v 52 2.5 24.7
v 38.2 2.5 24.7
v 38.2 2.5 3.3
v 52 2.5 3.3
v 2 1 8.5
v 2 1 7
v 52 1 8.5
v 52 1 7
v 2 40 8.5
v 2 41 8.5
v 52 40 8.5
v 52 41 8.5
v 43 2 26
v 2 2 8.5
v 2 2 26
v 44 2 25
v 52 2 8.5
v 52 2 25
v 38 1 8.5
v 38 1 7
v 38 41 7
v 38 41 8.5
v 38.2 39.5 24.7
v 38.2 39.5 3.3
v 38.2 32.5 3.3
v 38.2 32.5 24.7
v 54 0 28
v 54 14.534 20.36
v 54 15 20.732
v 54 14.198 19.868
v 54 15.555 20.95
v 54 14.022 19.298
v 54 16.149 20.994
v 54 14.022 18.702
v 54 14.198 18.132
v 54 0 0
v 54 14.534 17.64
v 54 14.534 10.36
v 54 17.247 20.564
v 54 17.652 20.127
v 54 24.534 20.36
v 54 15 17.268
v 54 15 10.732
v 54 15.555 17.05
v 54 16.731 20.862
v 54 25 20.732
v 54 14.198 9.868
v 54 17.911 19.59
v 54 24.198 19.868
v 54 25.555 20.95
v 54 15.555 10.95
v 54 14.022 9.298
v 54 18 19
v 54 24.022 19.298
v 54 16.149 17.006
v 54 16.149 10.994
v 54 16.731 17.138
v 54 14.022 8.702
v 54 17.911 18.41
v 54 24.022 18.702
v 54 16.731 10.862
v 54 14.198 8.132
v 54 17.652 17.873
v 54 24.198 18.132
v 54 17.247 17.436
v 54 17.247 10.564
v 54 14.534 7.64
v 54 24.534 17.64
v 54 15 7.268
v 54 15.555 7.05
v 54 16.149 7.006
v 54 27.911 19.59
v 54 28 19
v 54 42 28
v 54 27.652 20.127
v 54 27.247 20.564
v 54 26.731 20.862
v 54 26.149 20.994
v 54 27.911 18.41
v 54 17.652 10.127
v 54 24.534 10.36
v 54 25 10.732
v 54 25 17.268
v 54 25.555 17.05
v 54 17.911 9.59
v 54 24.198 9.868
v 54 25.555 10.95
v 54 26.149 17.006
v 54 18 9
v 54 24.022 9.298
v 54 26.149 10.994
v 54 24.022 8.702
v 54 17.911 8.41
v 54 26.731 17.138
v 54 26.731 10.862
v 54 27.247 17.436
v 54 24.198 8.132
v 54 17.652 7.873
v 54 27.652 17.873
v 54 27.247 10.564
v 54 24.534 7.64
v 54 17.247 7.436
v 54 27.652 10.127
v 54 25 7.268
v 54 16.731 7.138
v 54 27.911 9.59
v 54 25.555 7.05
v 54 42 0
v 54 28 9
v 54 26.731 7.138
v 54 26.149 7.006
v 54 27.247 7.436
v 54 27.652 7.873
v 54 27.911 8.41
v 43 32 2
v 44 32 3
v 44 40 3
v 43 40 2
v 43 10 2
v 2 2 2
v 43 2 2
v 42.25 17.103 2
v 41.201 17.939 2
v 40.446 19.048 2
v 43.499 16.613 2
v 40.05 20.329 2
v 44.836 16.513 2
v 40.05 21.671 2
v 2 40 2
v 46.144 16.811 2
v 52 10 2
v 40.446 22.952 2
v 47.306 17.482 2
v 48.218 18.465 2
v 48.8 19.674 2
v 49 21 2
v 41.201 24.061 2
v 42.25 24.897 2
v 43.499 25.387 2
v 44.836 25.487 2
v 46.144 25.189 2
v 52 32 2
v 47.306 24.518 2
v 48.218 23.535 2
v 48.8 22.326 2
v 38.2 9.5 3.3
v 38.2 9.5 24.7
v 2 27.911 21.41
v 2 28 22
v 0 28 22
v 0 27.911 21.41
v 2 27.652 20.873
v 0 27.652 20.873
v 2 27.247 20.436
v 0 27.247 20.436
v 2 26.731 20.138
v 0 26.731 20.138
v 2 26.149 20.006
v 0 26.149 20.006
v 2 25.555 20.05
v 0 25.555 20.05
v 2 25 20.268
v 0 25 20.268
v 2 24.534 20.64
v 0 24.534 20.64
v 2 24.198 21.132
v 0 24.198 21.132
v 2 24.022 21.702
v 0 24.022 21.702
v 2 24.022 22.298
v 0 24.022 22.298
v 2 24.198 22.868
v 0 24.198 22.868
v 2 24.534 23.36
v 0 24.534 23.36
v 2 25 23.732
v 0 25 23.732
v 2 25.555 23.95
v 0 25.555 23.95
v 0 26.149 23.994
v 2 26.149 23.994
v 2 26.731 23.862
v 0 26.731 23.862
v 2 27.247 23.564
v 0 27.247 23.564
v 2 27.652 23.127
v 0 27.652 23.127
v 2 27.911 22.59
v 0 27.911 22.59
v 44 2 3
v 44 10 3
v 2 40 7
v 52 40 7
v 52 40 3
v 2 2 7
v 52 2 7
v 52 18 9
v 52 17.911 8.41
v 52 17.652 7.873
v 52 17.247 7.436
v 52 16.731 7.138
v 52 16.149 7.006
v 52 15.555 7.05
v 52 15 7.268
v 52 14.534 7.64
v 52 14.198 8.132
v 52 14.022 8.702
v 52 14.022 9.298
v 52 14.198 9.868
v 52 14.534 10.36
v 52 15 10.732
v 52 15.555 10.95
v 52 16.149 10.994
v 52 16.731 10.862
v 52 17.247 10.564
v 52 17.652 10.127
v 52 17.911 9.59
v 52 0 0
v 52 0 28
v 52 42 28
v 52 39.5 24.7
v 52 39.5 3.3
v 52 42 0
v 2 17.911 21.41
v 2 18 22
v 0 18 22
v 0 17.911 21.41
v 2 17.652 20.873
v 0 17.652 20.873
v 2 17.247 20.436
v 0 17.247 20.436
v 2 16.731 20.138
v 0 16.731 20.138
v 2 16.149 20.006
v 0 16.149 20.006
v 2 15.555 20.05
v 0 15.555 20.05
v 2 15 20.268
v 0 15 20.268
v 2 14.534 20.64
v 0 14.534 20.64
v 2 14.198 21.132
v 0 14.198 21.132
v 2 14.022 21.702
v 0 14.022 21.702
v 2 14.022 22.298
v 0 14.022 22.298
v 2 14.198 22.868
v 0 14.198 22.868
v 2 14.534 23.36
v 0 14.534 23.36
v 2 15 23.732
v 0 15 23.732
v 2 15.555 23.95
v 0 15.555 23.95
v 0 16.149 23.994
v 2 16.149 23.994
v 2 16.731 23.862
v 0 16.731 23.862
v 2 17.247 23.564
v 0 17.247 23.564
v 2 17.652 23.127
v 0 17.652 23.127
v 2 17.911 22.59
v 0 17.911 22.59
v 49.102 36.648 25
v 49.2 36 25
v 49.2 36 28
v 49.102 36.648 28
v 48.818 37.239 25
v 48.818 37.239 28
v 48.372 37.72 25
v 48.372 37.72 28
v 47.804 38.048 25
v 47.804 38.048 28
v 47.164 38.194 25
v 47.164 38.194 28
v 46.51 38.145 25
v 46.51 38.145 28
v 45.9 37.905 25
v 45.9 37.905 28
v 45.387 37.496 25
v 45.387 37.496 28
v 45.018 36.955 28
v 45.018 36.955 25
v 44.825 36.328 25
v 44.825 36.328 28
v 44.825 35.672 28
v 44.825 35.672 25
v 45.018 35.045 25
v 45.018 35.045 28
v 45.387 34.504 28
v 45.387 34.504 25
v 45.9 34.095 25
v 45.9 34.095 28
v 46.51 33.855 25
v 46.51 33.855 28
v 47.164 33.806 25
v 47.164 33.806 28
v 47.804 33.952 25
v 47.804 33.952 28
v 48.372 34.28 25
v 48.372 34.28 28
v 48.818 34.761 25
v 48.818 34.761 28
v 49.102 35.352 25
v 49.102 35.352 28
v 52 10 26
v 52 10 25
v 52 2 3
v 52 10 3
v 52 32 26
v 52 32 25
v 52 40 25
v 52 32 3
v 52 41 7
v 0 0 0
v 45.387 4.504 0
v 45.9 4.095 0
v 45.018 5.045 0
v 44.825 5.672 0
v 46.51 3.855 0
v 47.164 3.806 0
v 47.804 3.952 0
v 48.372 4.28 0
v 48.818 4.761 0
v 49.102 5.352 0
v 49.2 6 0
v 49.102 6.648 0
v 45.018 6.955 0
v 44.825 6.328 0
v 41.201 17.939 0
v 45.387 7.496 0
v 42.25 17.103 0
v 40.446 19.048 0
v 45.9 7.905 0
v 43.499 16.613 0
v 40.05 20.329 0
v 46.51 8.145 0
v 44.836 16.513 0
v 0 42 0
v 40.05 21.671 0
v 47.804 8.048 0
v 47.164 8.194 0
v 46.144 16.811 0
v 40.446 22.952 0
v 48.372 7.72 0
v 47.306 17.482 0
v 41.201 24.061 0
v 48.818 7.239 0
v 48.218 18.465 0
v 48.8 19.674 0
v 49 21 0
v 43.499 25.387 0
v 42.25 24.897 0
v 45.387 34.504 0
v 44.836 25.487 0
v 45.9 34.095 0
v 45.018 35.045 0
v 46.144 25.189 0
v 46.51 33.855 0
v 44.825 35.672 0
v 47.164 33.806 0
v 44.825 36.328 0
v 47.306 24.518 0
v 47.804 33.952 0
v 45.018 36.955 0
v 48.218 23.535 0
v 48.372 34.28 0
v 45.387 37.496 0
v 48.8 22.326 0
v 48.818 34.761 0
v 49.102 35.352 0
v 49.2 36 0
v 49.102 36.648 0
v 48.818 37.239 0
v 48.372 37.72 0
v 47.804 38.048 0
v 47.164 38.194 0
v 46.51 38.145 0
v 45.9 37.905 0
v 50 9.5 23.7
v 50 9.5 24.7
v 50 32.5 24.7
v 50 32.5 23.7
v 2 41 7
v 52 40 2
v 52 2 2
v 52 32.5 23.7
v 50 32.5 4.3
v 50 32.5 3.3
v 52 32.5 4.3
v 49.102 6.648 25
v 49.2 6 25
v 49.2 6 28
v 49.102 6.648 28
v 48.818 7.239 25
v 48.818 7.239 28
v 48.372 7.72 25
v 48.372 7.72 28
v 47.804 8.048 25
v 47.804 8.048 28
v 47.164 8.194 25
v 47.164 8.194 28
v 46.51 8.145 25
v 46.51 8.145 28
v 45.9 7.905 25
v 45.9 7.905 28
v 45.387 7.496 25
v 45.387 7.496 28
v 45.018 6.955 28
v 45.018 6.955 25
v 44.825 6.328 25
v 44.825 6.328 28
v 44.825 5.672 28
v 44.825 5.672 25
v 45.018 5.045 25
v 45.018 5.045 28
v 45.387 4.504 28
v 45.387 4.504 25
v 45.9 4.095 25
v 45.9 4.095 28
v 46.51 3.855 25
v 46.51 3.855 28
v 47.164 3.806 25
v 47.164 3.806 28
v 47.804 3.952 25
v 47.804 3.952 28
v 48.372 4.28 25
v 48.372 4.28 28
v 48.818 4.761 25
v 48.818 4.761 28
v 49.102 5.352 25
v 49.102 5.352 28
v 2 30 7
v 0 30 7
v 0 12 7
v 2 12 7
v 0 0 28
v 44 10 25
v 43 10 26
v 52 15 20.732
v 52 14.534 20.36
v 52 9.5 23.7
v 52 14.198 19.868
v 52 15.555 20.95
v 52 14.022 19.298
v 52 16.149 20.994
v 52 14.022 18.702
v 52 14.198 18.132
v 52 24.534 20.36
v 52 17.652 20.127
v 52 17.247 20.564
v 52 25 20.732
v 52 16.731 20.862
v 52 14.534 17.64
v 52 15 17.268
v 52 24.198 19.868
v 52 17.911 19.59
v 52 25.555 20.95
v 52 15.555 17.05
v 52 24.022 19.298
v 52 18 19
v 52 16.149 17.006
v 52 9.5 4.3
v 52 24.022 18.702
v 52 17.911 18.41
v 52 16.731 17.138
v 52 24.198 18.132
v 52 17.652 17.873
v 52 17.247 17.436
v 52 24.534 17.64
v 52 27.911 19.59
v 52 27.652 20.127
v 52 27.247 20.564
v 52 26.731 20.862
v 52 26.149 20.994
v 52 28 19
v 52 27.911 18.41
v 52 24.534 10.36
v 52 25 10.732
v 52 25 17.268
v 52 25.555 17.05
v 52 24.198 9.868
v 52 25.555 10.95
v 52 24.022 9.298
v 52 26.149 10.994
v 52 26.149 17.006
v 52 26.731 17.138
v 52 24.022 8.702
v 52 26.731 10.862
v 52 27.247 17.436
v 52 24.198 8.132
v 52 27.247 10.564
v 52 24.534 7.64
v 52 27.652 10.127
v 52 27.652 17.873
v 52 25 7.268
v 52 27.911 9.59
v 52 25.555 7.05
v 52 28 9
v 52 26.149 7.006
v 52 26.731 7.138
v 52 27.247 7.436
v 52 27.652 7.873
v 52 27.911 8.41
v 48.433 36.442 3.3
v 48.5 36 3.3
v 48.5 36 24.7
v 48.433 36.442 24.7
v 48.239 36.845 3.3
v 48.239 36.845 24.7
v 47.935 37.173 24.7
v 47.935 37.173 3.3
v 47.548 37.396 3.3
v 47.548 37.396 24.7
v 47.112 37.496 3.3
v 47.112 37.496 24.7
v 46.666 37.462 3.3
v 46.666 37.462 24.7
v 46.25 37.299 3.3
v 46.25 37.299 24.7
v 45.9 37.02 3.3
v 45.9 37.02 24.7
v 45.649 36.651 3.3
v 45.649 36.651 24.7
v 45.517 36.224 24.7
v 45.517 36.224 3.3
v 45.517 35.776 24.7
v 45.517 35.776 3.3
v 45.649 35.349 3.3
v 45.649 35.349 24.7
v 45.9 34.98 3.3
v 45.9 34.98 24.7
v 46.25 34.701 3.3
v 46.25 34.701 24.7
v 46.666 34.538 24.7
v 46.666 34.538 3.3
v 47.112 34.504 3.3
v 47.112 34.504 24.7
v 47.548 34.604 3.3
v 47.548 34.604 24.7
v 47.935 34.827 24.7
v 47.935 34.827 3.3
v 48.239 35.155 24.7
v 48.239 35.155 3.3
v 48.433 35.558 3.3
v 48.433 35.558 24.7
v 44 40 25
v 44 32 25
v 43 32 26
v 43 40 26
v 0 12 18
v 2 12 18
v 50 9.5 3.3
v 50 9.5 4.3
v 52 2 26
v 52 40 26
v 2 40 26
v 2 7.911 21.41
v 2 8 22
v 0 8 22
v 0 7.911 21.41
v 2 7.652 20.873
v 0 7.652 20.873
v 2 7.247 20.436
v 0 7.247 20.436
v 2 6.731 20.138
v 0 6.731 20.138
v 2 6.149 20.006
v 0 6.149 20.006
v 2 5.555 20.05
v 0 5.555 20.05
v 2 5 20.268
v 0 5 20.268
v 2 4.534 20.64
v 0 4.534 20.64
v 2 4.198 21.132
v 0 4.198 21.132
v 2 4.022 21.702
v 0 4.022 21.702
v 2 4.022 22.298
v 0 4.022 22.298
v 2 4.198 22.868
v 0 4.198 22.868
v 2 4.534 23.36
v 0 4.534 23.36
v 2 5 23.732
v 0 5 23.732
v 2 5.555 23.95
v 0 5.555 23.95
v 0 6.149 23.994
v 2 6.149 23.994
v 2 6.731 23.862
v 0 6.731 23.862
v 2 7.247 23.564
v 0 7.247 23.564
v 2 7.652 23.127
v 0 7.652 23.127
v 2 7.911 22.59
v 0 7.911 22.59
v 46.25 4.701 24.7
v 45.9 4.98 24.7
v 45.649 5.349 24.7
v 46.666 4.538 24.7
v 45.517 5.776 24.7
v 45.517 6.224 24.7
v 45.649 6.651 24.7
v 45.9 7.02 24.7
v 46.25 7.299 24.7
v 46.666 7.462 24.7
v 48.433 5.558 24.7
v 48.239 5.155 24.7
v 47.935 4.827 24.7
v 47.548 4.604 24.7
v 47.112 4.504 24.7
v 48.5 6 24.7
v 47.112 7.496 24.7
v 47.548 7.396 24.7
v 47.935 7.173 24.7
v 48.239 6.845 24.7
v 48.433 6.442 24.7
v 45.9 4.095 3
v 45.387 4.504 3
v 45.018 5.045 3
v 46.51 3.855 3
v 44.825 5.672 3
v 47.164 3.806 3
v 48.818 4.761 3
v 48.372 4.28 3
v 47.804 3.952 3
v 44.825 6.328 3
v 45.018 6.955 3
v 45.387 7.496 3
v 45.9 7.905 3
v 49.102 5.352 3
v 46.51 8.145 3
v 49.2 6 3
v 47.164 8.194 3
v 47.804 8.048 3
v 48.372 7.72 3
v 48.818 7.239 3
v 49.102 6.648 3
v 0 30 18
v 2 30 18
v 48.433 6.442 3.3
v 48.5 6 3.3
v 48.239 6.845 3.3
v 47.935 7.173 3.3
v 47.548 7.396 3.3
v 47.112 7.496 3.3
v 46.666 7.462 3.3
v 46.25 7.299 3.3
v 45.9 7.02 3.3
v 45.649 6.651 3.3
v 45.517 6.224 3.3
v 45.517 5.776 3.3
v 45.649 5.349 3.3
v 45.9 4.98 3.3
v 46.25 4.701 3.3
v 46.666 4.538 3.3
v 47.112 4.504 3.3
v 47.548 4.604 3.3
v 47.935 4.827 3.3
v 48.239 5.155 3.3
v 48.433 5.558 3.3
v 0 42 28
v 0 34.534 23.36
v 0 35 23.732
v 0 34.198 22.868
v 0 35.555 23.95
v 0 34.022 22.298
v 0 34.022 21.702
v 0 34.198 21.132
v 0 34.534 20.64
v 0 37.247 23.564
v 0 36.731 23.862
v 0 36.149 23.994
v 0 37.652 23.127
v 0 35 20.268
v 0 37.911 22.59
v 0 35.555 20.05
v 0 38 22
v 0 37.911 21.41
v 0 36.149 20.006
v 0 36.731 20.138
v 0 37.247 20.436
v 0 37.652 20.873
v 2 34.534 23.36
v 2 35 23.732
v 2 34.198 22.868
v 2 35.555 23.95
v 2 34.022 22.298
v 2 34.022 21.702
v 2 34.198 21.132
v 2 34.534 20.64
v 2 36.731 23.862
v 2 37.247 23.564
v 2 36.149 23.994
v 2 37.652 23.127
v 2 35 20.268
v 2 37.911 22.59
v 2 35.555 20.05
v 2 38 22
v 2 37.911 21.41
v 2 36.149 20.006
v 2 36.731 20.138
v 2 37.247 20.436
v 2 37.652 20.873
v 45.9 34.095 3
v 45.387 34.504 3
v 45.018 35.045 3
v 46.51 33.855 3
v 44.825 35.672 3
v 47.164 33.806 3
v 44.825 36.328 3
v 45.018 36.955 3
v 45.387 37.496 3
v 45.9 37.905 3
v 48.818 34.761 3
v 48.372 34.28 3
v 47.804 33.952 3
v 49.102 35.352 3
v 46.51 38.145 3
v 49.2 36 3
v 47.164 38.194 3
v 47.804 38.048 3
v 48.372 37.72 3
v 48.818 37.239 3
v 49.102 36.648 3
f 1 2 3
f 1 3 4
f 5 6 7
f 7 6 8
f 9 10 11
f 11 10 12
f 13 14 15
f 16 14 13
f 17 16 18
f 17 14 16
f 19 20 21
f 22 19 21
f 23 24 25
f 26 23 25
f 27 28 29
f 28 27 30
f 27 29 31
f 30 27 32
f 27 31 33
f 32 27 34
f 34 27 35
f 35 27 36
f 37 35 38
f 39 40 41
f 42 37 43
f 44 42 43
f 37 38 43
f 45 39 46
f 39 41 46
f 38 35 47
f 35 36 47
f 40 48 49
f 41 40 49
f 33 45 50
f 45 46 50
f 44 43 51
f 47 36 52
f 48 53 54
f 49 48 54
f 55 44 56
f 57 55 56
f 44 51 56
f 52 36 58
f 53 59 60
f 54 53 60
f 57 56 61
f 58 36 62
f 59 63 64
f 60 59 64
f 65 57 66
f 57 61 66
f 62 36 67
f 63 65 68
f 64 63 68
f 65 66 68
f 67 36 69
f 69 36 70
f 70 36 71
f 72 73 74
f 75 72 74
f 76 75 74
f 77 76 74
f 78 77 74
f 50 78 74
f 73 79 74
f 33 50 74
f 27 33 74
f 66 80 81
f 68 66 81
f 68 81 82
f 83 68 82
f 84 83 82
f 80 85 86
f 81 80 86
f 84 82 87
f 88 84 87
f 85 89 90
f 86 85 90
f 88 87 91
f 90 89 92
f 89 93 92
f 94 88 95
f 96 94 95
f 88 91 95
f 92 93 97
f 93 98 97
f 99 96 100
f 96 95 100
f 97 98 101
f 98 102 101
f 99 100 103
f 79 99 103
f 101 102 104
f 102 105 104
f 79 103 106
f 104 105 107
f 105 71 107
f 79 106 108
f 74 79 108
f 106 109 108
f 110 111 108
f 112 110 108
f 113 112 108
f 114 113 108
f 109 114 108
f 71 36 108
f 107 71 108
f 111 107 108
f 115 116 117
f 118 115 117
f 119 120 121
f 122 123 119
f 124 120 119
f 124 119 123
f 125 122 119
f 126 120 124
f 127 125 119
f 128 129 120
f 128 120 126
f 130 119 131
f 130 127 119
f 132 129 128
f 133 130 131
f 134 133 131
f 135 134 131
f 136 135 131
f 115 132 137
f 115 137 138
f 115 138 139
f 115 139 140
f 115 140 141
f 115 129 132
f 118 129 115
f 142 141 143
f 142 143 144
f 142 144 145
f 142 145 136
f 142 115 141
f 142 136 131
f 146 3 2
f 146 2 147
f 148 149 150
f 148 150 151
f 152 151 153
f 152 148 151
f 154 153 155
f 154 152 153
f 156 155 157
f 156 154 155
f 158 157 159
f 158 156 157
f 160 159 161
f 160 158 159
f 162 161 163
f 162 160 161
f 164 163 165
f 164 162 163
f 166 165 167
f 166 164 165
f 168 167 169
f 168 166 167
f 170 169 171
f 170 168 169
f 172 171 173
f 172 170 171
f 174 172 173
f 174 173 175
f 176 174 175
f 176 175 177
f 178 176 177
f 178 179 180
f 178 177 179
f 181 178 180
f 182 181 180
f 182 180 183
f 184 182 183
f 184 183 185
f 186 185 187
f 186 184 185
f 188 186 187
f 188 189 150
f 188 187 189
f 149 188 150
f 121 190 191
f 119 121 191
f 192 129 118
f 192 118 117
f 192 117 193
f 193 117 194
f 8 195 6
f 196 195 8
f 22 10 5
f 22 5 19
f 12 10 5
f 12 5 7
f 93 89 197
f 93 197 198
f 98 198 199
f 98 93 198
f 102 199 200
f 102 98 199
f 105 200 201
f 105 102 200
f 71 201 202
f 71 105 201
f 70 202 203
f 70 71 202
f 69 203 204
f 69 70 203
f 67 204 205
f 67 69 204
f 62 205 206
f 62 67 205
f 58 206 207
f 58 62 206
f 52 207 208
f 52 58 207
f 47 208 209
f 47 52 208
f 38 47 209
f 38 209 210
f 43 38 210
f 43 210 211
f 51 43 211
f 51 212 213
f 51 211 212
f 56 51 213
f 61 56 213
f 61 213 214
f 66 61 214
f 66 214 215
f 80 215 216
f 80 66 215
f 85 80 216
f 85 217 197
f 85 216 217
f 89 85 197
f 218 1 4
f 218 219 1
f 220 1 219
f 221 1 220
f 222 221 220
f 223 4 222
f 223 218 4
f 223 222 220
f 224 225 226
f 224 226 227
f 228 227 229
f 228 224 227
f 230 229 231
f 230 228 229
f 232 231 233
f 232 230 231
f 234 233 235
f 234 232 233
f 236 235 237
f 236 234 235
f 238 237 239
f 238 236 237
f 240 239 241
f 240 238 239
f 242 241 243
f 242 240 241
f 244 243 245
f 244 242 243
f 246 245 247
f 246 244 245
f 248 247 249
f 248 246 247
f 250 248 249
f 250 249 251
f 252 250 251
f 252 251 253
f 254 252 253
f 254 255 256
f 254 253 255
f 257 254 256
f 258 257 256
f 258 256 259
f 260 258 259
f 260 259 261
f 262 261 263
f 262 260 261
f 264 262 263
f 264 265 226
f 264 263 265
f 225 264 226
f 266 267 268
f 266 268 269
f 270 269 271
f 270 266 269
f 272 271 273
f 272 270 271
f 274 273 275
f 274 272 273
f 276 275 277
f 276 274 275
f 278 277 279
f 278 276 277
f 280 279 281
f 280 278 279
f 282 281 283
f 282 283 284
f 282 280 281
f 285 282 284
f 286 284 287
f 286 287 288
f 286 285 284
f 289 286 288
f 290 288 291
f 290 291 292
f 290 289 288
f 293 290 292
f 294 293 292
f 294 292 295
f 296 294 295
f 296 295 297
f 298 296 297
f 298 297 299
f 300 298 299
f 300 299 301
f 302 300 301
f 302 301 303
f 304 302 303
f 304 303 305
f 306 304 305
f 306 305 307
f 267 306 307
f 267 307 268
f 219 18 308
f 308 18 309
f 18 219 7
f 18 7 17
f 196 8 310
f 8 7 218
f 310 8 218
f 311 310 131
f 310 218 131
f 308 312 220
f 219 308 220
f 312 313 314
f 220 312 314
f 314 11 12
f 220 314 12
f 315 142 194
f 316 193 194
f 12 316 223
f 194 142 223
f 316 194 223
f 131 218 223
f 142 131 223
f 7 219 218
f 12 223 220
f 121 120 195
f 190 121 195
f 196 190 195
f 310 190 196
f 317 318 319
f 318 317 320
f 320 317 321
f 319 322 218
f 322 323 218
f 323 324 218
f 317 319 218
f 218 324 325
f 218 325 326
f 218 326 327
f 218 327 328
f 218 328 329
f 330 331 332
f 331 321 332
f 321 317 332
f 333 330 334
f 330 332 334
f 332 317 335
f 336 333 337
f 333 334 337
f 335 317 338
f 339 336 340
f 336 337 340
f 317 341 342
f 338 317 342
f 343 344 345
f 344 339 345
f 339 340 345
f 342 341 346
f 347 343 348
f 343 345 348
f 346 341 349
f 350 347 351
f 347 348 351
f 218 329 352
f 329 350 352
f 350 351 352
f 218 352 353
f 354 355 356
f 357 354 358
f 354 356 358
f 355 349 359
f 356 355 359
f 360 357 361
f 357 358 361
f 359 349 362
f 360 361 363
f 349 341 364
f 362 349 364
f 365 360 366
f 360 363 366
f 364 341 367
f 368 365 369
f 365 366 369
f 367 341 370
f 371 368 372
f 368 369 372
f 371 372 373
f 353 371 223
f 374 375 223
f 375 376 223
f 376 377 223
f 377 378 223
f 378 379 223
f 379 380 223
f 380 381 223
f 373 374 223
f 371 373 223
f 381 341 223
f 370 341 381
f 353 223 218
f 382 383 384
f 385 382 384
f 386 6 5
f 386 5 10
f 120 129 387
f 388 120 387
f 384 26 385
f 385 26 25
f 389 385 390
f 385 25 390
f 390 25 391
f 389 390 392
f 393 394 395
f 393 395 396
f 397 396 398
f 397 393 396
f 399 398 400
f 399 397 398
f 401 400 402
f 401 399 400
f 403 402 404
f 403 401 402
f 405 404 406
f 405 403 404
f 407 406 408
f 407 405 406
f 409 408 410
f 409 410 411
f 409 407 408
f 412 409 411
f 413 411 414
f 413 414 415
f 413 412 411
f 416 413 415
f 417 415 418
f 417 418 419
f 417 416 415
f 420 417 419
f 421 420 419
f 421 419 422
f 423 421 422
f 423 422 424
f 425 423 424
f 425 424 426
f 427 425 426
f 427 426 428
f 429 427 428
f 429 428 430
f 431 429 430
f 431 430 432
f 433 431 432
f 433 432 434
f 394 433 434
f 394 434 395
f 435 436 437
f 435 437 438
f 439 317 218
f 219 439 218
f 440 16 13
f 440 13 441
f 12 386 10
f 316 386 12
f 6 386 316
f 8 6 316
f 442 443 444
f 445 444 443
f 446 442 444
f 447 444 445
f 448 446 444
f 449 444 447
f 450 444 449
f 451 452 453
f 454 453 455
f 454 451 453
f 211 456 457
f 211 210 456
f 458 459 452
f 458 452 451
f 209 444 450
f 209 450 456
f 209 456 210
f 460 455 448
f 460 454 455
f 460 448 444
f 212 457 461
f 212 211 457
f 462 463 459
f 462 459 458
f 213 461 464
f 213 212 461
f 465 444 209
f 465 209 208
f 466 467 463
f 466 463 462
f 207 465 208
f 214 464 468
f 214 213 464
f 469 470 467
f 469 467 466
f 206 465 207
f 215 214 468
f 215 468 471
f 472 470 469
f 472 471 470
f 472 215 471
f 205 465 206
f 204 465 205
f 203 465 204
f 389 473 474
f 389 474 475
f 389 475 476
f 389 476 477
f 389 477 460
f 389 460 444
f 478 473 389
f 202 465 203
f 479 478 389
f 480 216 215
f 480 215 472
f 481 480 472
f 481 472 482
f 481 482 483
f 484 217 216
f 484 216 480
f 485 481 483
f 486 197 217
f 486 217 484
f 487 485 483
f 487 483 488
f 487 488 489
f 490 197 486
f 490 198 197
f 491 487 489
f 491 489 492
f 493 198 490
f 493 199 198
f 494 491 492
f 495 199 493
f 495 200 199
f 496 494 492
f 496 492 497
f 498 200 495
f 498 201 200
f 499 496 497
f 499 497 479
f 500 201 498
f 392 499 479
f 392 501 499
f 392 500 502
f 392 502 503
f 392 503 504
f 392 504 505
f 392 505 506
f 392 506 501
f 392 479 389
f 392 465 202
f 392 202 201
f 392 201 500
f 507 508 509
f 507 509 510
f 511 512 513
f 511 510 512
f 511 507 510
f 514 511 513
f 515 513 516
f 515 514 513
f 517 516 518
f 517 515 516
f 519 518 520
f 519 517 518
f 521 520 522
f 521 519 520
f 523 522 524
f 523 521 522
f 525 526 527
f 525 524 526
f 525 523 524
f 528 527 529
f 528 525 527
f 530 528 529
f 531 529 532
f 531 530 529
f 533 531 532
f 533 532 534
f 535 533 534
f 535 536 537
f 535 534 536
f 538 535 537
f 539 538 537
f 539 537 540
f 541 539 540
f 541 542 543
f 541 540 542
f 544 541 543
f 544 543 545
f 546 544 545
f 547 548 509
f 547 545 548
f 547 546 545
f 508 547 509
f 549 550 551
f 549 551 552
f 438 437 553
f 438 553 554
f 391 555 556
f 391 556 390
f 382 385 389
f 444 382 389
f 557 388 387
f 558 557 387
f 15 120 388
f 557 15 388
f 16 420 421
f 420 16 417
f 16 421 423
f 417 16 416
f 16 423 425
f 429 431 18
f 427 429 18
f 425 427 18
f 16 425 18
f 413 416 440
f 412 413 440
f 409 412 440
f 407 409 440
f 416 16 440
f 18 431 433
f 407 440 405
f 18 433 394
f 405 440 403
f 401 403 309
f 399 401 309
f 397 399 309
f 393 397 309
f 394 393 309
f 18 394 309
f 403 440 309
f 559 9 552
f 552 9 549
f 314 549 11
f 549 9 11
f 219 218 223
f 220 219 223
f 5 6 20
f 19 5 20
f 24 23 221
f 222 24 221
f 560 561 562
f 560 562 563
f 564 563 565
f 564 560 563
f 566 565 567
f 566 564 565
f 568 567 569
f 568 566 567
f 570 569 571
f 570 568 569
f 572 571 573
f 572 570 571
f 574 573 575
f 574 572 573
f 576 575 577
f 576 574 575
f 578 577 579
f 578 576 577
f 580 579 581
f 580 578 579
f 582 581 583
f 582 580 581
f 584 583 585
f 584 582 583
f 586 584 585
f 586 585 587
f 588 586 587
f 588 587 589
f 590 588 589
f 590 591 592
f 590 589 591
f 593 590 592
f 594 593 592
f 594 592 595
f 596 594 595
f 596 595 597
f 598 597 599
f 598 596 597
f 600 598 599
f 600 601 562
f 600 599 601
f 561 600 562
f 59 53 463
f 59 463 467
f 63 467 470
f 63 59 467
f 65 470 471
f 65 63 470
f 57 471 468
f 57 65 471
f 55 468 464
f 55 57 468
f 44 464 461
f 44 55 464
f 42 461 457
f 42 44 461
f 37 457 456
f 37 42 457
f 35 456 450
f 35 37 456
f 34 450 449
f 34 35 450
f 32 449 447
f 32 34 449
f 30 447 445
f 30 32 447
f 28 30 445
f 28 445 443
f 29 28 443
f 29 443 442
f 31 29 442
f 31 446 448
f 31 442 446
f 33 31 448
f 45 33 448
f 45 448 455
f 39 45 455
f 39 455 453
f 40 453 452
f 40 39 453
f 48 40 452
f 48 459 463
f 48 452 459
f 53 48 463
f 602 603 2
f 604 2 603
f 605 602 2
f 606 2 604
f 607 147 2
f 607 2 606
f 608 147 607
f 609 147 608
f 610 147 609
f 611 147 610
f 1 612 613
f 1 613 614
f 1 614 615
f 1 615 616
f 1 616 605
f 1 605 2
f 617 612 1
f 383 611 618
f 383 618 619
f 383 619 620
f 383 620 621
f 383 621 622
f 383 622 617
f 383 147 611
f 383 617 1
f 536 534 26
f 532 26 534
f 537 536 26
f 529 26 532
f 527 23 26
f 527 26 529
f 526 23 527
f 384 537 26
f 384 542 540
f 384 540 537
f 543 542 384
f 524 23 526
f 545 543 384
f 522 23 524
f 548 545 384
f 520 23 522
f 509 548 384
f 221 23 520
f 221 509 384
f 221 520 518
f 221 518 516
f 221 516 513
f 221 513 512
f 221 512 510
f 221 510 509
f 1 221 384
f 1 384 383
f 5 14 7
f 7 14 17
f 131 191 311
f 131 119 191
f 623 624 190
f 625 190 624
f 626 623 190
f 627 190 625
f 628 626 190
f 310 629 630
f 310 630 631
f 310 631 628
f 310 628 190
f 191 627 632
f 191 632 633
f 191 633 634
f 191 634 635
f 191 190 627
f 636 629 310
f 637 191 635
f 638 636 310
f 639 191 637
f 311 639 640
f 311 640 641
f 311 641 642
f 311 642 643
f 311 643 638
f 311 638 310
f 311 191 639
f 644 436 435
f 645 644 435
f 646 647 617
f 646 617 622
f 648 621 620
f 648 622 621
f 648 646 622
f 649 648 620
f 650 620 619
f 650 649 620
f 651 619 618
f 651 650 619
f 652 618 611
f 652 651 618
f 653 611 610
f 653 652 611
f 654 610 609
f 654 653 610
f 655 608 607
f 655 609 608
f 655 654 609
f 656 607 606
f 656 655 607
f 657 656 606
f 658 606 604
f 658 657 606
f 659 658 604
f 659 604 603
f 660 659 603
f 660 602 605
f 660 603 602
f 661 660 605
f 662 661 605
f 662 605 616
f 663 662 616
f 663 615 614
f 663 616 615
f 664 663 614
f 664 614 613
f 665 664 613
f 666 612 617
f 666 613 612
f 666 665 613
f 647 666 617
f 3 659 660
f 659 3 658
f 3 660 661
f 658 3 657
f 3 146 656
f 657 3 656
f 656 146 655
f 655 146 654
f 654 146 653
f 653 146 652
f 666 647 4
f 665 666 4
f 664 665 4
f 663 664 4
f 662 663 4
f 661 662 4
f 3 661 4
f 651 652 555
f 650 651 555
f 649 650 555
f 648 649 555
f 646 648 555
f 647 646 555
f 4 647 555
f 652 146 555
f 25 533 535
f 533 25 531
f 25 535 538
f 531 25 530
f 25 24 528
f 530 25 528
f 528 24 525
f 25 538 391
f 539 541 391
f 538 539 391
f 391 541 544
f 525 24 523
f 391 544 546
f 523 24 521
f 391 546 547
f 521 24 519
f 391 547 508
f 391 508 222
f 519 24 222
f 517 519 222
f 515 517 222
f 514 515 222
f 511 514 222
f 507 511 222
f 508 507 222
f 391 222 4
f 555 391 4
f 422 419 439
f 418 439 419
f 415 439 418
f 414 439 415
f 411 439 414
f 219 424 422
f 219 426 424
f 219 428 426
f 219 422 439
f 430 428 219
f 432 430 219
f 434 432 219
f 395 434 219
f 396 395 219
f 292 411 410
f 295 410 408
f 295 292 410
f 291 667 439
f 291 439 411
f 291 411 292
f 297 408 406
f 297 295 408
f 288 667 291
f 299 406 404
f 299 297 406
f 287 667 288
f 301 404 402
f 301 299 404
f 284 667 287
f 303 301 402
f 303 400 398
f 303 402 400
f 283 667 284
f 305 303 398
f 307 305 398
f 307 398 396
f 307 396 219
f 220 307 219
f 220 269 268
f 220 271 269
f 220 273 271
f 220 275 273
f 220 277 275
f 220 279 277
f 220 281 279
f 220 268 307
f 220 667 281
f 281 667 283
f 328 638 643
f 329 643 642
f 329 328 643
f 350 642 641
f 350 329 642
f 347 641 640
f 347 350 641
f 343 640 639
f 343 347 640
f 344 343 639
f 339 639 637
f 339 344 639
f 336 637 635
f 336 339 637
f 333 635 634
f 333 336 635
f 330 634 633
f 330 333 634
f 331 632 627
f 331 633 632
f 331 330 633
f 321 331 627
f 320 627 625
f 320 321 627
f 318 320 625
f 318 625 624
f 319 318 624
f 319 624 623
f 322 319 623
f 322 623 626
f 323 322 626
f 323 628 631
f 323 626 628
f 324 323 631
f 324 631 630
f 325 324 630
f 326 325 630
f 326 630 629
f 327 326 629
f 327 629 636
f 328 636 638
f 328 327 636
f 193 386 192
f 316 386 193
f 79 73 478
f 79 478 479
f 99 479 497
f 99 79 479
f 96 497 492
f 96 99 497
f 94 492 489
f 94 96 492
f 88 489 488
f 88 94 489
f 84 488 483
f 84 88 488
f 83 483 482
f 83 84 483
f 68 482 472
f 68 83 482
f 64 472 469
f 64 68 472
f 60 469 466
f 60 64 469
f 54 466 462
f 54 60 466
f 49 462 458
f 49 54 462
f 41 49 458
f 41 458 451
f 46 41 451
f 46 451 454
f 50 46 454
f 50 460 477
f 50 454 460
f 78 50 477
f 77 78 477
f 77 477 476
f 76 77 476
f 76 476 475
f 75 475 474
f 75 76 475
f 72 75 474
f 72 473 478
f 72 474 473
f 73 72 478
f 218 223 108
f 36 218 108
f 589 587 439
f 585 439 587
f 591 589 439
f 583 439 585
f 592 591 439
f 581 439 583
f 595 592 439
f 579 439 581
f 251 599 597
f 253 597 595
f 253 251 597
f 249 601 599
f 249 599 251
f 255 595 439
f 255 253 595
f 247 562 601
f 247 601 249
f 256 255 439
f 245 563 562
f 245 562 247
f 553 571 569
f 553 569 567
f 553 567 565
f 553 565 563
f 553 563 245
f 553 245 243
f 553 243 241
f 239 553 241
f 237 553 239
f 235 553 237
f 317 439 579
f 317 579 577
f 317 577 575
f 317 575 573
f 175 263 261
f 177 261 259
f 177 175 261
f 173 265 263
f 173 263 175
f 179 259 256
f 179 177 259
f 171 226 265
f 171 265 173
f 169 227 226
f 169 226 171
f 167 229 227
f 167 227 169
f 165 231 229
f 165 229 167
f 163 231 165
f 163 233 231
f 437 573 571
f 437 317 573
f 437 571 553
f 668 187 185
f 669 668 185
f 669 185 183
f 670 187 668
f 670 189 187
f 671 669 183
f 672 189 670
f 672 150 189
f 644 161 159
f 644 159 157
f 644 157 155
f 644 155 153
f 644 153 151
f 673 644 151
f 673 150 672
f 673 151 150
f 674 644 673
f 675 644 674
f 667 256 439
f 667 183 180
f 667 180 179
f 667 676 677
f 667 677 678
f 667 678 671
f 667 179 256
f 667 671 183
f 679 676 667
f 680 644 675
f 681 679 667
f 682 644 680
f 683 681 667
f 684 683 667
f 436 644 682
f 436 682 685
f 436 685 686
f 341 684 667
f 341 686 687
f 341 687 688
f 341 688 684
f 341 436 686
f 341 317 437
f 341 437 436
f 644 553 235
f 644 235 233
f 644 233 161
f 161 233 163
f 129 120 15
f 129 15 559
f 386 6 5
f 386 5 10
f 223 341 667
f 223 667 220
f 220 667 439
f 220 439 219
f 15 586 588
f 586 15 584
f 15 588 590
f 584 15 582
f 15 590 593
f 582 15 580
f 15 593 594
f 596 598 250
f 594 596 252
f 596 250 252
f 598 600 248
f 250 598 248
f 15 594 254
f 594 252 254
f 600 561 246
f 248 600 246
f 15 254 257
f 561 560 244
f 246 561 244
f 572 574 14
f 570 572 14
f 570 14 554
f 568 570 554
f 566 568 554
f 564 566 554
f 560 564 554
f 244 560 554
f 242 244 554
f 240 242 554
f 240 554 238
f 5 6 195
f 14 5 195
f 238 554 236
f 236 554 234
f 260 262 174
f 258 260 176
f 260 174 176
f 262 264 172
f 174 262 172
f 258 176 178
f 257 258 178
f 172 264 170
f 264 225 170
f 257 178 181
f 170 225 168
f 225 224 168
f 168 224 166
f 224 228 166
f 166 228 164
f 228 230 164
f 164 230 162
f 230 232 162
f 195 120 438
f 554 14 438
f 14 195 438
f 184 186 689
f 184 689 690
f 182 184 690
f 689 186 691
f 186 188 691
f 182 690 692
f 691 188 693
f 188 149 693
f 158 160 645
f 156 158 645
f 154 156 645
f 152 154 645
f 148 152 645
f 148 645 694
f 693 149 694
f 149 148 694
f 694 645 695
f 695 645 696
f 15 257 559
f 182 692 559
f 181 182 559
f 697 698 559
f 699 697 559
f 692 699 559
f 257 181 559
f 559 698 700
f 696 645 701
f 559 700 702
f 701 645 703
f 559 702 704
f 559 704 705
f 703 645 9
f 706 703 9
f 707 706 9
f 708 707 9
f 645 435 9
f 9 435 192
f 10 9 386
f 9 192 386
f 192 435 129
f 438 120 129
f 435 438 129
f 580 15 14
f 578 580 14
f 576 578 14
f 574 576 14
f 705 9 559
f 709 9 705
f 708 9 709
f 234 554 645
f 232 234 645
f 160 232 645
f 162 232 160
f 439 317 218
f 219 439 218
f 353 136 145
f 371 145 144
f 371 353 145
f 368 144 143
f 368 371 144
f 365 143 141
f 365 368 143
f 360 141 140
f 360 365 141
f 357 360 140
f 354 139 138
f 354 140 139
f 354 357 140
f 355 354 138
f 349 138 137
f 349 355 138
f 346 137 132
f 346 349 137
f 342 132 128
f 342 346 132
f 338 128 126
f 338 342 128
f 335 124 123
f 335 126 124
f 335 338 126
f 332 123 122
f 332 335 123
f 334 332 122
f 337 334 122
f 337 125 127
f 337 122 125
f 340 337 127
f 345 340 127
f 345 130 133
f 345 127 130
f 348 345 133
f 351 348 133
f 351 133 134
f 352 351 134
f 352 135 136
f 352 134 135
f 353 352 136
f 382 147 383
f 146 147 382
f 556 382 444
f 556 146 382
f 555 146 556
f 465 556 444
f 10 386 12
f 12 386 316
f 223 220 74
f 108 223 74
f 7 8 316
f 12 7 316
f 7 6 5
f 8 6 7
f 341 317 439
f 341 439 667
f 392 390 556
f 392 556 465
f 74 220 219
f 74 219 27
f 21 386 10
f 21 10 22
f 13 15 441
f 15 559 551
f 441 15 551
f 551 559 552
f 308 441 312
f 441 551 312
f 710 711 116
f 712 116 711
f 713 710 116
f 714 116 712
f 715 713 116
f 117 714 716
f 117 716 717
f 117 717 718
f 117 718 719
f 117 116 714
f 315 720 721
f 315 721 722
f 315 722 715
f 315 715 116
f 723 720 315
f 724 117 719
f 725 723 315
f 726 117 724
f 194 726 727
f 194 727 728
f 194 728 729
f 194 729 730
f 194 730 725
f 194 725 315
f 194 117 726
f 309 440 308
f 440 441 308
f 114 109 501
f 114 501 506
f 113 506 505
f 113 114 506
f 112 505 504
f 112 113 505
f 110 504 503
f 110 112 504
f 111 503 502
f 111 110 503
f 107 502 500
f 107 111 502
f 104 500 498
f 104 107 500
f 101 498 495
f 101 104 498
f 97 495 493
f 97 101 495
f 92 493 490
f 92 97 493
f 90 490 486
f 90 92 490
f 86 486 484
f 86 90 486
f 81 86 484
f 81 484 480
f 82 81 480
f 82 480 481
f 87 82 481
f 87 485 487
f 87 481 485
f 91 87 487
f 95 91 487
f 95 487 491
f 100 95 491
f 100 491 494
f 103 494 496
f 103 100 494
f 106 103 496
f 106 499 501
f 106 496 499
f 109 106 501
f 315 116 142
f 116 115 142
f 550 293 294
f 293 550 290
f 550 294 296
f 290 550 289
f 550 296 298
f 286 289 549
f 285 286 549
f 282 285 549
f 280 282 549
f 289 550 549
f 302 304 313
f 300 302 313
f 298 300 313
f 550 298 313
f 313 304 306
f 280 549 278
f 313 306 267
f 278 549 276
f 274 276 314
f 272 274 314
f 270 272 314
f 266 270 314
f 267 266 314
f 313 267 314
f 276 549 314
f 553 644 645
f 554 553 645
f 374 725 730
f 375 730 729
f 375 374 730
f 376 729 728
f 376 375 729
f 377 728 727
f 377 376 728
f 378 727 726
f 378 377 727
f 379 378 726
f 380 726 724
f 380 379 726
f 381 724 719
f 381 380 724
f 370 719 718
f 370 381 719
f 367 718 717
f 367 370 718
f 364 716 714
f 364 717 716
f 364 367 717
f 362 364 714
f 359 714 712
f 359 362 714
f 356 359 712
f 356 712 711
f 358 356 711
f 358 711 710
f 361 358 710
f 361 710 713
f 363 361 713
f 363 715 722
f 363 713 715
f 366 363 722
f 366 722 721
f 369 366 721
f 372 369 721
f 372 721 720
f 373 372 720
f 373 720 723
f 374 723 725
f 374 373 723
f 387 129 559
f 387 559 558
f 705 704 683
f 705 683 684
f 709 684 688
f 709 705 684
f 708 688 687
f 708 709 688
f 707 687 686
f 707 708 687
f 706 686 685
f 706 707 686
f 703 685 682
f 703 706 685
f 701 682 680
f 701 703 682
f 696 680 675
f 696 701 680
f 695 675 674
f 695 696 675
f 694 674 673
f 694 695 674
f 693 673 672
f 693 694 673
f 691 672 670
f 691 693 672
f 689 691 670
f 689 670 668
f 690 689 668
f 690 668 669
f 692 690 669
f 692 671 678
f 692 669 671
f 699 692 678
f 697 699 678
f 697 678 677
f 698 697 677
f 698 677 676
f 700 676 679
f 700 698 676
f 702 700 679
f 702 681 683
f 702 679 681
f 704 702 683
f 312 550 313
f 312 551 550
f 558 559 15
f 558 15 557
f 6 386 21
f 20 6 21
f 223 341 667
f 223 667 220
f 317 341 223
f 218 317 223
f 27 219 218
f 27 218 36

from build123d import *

# Parameters (mm, degrees)
BOX003_W          = 36
BOX003_H          = 40
BOX003_DEPTH      = 1.5
CYLINDER001_R     = 2.2
CYLINDER001_DEPTH = 28
ARRAY001_Y_COUNT  = 2
ARRAY001_Y_PITCH  = 30
BOX005_W          = 10
BOX005_H          = 10
BOX005_DEPTH      = 3
CHAMFER_SIZE      = 2
ARRAY_Y_COUNT     = 2
ARRAY_Y_PITCH     = 32
BOX_W             = 50
BOX_H             = 38
BOX_DEPTH         = 24
BOX004_W          = 10
BOX004_H          = 18
BOX004_DEPTH      = 11
CYLINDER_R        = 4.5
CYLINDER_DEPTH    = 10
CYLINDER002_R     = 2
CYLINDER002_DEPTH = 100
ARRAY002_Y_COUNT  = 4
ARRAY002_Y_PITCH  = 10
BOX001_W          = 50
BOX001_H          = 40
BOX001_DEPTH      = 1.5
BOX002_W          = 52
BOX002_H          = 42
BOX002_DEPTH      = 28
CYLINDER003_R     = 1.5
CYLINDER003_DEPTH = 28
ARRAY003_Y_COUNT  = 2
ARRAY003_Y_PITCH  = 30
CYLINDER004_R     = 2
CYLINDER004_DEPTH = 100
ARRAY004_Y_COUNT  = 2
ARRAY004_Y_PITCH  = 10
ARRAY004_Z_COUNT  = 2
ARRAY004_Z_PITCH  = 10
BOX007_W          = 13.8
BOX007_H          = 7
BOX007_DEPTH      = 21.4
BOX006_W          = 2
BOX006_H          = 42
BOX006_DEPTH      = 28
BOX008_W          = 2
BOX008_H          = 36
BOX008_DEPTH      = 1
BOX009_W          = 50
BOX009_H          = 38
BOX009_DEPTH      = 24
BOX010_W          = 50
BOX010_H          = 40
BOX010_DEPTH      = 1.5
BOX011_W          = 52
BOX011_H          = 42
BOX011_DEPTH      = 28


with BuildPart() as pcb_mockup:
    # Box003 → Box003 (new body)
    with BuildSketch(Plane(origin=(2, 1, 7), x_dir=(1, 0, 0), z_dir=(0, 0, 1))):
        with Locations((18, 20)):
            Rectangle(BOX003_W, BOX003_H)
    extrude(amount=BOX003_DEPTH)


with BuildPart() as bolt_hole_array:
    # Cylinder001 → Cylinder001 (new body)
    with BuildSketch(Plane.XY):
        Circle(CYLINDER001_R)
    extrude(amount=CYLINDER001_DEPTH)

    # Array001 Y: bolt hole array ×2


with BuildPart() as bolt_hole_array_1:
    add(bolt_hole_array.part)
    with Locations(*[(0, i * ARRAY001_Y_PITCH, 0) for i in range(1, ARRAY001_Y_COUNT)]):
        add(bolt_hole_array.part)


with BuildPart() as bolt_hole_array_2:
    # Array001 placement: moved
    add(bolt_hole_array_1.part.moved(Location((47, 6, 0))))


with BuildPart() as bolt_hole_stand_array:
    # Box005 → Box005 (new body)
    with BuildSketch(Plane(origin=(42, 0, 0), x_dir=(1, 0, 0), z_dir=(0, 0, 1))):
        with Locations((5, 5)):
            Rectangle(BOX005_W, BOX005_H)
    extrude(amount=BOX005_DEPTH)

    # Chamfer
    chamfer_edges = [bolt_hole_stand_array.edges().sort_by_distance(p)[0] for p in [
        (42, 5, 3),
    ]]
    chamfer(chamfer_edges, length=CHAMFER_SIZE)

    # Array Y: bolt hole stand array ×2


with BuildPart() as bolt_hole_stand_array_1:
    add(bolt_hole_stand_array.part)
    with Locations(*[(0, i * ARRAY_Y_PITCH, 0) for i in range(1, ARRAY_Y_COUNT)]):
        add(bolt_hole_stand_array.part)


with BuildPart() as part_mirroring:
    # Part__Mirroring: instance of bolt hole stand array
    add(bolt_hole_stand_array_1.part.mirror(Plane(origin=(0, 0, 14), x_dir=(0, 1, 0), z_dir=(0, 0, 1))))


with BuildPart() as internal_cube:
    # Box → Box (new body)
    with BuildSketch(Plane(origin=(2, 2, 2), x_dir=(1, 0, 0), z_dir=(0, 0, 1))):
        with Locations((25, 19)):
            Rectangle(BOX_W, BOX_H)
    extrude(amount=BOX_DEPTH)


with BuildPart() as usb_hole_cube:
    # Box004 → Box004 (new body)
    with BuildSketch(Plane(origin=(0, 12, 7), x_dir=(1, 0, 0), z_dir=(0, 0, 1))):
        with Locations((5, 9)):
            Rectangle(BOX004_W, BOX004_H)
    extrude(amount=BOX004_DEPTH)


with BuildPart() as wire_hole:
    # Cylinder → Cylinder (new body)
    with BuildSketch(Plane(origin=(44.5, 21, 0), x_dir=(1, 0, 0), z_dir=(0, 0, 1))):
        Circle(CYLINDER_R)
    extrude(amount=CYLINDER_DEPTH)


with BuildPart() as ventilation_hole_array:
    # Cylinder002 → Cylinder002 (new body)
    with BuildSketch(Plane(origin=(50, 0, 22), x_dir=(0, 1, 0), z_dir=(-1, 0, 0))):
        Circle(CYLINDER002_R)
    extrude(amount=CYLINDER002_DEPTH)

    # Array002 Y: ventilation hole array ×4


with BuildPart() as ventilation_hole_array_1:
    add(ventilation_hole_array.part)
    with Locations(*[(0, i * ARRAY002_Y_PITCH, 0) for i in range(1, ARRAY002_Y_COUNT)]):
        add(ventilation_hole_array.part)


with BuildPart() as ventilation_hole_array_2:
    # Array002 placement: moved
    add(ventilation_hole_array_1.part.moved(Location((0, 6, 0))))


with BuildPart() as extract_fusion:
    # Box001 → Box001 (new body)
    with BuildSketch(Plane(origin=(2, 1, 7), x_dir=(1, 0, 0), z_dir=(0, 0, 1))):
        with Locations((25, 20)):
            Rectangle(BOX001_W, BOX001_H)
    extrude(amount=BOX001_DEPTH)

    # Fusion: union internal cube, usb hole cube, wire hole, ventilation hole array
    add(internal_cube.part)
    add(usb_hole_cube.part)
    add(wire_hole.part)
    add(ventilation_hole_array_2.part)


with BuildPart() as full_body_cut:
    # Box002 → Box002 (new body)
    with BuildSketch(Plane.XY):
        with Locations((26, 21)):
            Rectangle(BOX002_W, BOX002_H)
    extrude(amount=BOX002_DEPTH)

    # Cut: cut extract fusion
    add(extract_fusion.part, mode=Mode.SUBTRACT)

    # Fusion001: union Part__Mirroring, bolt hole stand array
    add(part_mirroring.part)
    add(bolt_hole_stand_array_1.part)

    # Cut001: cut bolt hole array
    add(bolt_hole_array_2.part, mode=Mode.SUBTRACT)


with BuildPart() as bolt_hole_array001:
    # Cylinder003 → Cylinder003 (new body)
    with BuildSketch(Plane.XY):
        Circle(CYLINDER003_R)
    extrude(amount=CYLINDER003_DEPTH)

    # Array003 Y: bolt hole array001 ×2


with BuildPart() as bolt_hole_array001_1:
    add(bolt_hole_array001.part)
    with Locations(*[(0, i * ARRAY003_Y_PITCH, 0) for i in range(1, ARRAY003_Y_COUNT)]):
        add(bolt_hole_array001.part)


with BuildPart() as bolt_hole_array001_2:
    # Array003 placement: moved
    add(bolt_hole_array001_1.part.moved(Location((47, 6, 0))))


with BuildPart() as wall_hole_fusion:
    # Cylinder004 → Cylinder004 (new body)
    with BuildSketch(Plane(origin=(100, 0, 9), x_dir=(0, 1, 0), z_dir=(-1, 0, 0))):
        Circle(CYLINDER004_R)
    extrude(amount=CYLINDER004_DEPTH)

    # Array004 Y: wall hole fusion ×2


with BuildPart() as wall_hole_fusion_1:
    add(wall_hole_fusion.part)
    with Locations(*[(0, i * ARRAY004_Y_PITCH, 0) for i in range(1, ARRAY004_Y_COUNT)]):
        add(wall_hole_fusion.part)

    # Array004 Z: wall hole fusion ×2


with BuildPart() as wall_hole_fusion_2:
    add(wall_hole_fusion_1.part)
    with Locations(*[(0, 0, i * ARRAY004_Z_PITCH) for i in range(1, ARRAY004_Z_COUNT)]):
        add(wall_hole_fusion_1.part)


with BuildPart() as wall_hole_fusion_3:
    # Array004 placement: moved
    add(wall_hole_fusion_2.part.moved(Location((0, 16, 0))))

    # Fusion003: union bolt hole array001
    add(bolt_hole_array001_2.part)


with BuildPart() as wall_side:
    # Box007 → Box007 (new body)
    with BuildSketch(Plane(origin=(38.2, 2.5, 3.3), x_dir=(1, 0, 0), z_dir=(0, 0, 1))):
        with Locations((6.9, 3.5)):
            Rectangle(BOX007_W, BOX007_H)
    extrude(amount=BOX007_DEPTH)


with BuildPart() as part_mirroring001:
    # Part__Mirroring001: instance of wall side
    add(wall_side.part.mirror(Plane(origin=(0, 21, 0), x_dir=(1, 0, 0), z_dir=(0, 1, 0))))


with BuildPart() as wall_cube:
    # Box006 → Box006 (new body)
    with BuildSketch(Plane(origin=(52, 0, 0), x_dir=(1, 0, 0), z_dir=(0, 0, 1))):
        with Locations((1, 21)):
            Rectangle(BOX006_W, BOX006_H)
    extrude(amount=BOX006_DEPTH)


with BuildPart() as y_wall:
    # Box008 → Box008 (new body)
    with BuildSketch(Plane(origin=(50, 3, 3.3), x_dir=(1, 0, 0), z_dir=(0, 0, 1))):
        with Locations((1, 18)):
            Rectangle(BOX008_W, BOX008_H)
    extrude(amount=BOX008_DEPTH)


with BuildPart() as part_mirroring002:
    # Part__Mirroring002: instance of y_wall
    add(y_wall.part.mirror(Plane(origin=(0, 0, 14), x_dir=(0, 1, 0), z_dir=(0, 0, 1))))


with BuildPart() as wall_cut:
    # Fusion002 base: copy of wall side
    add(wall_side.part)

    # Fusion002: union Part__Mirroring001, wall cube, Part__Mirroring002, y_wall
    add(part_mirroring001.part)
    add(wall_cube.part)
    add(part_mirroring002.part)
    add(y_wall.part)

    # Cut002: cut wall hole fusion
    add(wall_hole_fusion_3.part, mode=Mode.SUBTRACT)


with BuildPart() as internal_cube001:
    # Box009 → Box009 (new body)
    with BuildSketch(Plane(origin=(2, 2, 2), x_dir=(1, 0, 0), z_dir=(0, 0, 1))):
        with Locations((25, 19)):
            Rectangle(BOX009_W, BOX009_H)
    extrude(amount=BOX009_DEPTH)


with BuildPart() as pcb_extract_cube001:
    # Box010 → Box010 (new body)
    with BuildSketch(Plane(origin=(2, 1, 7), x_dir=(1, 0, 0), z_dir=(0, 0, 1))):
        with Locations((25, 20)):
            Rectangle(BOX010_W, BOX010_H)
    extrude(amount=BOX010_DEPTH)


with BuildPart() as external_cube001:
    # Box011 → Box011 (new body)
    with BuildSketch(Plane.XY):
        with Locations((26, 21)):
            Rectangle(BOX011_W, BOX011_H)
    extrude(amount=BOX011_DEPTH)


solid = Compound([pcb_mockup.part, full_body_cut.part, wall_cut.part, internal_cube001.part, pcb_extract_cube001.part, external_cube001.part])
